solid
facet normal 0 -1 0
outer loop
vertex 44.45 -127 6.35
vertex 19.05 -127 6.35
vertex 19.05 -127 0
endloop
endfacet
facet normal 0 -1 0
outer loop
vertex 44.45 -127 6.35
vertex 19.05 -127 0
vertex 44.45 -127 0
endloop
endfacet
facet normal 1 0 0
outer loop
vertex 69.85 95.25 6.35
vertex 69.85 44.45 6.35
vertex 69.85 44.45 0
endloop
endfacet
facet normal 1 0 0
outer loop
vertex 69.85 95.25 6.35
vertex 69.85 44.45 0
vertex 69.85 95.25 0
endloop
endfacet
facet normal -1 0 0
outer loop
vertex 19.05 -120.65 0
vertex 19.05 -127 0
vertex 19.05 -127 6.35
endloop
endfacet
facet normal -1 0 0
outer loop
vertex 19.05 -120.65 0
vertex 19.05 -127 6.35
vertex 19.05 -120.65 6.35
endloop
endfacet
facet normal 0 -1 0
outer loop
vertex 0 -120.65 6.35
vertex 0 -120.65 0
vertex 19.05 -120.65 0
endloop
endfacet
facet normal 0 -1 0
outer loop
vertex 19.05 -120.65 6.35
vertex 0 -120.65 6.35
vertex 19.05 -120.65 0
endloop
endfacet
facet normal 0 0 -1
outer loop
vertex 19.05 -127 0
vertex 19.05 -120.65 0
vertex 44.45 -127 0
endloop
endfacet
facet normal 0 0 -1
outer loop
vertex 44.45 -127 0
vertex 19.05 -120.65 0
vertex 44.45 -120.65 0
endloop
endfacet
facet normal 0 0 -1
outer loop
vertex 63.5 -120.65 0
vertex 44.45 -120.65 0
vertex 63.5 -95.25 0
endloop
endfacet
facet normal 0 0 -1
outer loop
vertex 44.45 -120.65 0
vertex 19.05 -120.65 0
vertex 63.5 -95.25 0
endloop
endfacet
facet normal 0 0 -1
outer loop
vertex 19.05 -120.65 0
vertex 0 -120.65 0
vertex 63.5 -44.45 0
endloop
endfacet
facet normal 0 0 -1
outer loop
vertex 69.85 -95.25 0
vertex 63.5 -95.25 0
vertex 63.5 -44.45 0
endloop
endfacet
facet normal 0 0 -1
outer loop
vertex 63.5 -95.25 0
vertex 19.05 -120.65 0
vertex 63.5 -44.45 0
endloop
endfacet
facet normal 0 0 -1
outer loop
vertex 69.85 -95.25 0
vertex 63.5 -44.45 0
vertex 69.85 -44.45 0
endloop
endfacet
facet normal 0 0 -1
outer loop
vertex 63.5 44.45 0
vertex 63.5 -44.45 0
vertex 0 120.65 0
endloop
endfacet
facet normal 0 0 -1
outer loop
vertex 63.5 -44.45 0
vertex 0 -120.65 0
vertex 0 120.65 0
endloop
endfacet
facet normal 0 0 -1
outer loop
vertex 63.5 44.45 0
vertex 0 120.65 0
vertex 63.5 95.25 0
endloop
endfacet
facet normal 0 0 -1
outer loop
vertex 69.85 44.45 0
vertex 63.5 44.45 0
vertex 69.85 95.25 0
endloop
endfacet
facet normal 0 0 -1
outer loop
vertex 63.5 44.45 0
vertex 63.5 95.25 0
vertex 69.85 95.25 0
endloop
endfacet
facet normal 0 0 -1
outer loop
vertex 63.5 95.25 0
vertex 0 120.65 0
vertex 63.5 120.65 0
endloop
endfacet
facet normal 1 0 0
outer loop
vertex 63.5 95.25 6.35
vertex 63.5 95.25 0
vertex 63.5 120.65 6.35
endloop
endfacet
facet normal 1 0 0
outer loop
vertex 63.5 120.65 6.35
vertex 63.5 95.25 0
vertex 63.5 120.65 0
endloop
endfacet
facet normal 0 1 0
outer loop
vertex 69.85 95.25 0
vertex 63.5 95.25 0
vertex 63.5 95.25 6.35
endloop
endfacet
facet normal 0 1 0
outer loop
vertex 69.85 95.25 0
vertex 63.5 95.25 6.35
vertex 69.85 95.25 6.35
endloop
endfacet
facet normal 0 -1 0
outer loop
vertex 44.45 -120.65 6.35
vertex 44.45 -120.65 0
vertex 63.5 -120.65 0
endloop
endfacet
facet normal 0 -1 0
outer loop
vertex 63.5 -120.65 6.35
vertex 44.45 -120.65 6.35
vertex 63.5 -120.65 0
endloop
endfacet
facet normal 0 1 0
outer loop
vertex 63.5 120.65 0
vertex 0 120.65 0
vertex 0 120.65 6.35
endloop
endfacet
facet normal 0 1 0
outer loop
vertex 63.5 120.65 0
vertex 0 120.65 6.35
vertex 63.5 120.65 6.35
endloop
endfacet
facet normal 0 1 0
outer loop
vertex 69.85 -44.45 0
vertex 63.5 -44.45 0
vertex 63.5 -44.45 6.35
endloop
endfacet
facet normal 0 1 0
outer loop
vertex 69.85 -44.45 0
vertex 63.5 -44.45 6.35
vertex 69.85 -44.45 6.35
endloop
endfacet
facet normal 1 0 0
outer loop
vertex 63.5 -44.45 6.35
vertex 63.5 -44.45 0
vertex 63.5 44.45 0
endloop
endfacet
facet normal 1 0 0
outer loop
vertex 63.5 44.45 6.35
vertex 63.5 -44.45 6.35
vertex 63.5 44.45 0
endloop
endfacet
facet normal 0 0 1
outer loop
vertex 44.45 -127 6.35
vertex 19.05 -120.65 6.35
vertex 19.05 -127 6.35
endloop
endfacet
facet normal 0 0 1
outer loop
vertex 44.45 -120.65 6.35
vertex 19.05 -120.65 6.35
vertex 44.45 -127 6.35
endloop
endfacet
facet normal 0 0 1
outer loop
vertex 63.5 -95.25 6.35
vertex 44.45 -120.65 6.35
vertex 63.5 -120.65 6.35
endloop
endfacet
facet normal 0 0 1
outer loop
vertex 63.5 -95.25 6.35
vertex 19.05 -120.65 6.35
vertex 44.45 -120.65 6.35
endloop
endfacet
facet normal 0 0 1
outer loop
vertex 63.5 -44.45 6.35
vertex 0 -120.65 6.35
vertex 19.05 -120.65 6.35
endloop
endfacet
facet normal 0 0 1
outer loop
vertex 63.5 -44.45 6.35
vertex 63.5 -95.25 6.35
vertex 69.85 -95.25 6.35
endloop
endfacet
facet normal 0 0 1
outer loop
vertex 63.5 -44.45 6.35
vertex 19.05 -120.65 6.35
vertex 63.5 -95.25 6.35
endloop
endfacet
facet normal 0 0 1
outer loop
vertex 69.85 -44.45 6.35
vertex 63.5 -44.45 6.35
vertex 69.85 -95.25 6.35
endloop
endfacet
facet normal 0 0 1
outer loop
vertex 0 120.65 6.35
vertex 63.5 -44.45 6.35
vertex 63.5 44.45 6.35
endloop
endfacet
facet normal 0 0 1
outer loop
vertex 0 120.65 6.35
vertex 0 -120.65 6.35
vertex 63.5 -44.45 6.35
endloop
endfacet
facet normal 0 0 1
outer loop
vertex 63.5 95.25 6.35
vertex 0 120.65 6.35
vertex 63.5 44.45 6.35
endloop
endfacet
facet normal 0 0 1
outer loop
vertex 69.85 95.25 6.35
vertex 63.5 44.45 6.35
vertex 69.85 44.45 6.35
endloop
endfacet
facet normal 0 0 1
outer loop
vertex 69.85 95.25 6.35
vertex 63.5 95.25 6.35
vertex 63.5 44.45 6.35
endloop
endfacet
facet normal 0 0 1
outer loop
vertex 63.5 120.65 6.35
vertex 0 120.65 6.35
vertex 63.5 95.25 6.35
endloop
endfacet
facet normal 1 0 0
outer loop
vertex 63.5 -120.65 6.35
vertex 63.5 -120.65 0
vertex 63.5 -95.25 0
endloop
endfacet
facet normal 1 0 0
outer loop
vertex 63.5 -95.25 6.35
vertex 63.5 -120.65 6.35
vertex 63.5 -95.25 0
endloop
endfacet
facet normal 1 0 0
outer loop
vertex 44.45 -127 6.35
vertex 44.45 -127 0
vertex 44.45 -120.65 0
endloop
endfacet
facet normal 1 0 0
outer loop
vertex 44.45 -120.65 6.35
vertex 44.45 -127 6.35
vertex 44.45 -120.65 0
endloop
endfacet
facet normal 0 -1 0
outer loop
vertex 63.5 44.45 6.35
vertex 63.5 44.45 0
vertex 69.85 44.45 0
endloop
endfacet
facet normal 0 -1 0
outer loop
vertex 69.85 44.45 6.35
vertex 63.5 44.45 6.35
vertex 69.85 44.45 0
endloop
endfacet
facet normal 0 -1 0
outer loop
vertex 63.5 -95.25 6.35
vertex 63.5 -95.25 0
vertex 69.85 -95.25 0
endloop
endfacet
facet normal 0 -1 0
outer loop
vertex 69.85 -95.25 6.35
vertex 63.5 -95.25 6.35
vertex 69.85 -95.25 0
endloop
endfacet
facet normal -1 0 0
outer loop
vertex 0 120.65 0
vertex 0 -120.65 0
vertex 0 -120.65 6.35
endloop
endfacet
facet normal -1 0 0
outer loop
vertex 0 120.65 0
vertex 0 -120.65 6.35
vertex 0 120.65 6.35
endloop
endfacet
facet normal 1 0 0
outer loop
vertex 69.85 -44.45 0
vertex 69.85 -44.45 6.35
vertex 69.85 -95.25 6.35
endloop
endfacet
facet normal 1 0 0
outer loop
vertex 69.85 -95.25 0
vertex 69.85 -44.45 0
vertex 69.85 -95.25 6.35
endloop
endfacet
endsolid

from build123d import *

# Parameters (mm, degrees)
F0_W     = 63.5
F0_H     = 241.3
F1_DEPTH = 6.35
F2_W     = 6.35
F2_H     = 50.8
F3_DEPTH = 6.35
F4_W     = 25.4
F4_H     = 6.35
F5_DEPTH = 6.35


# Not quite as in the source:
# - a pattern or mirror of a feature is missing from the dataset's text; its kind, count and spacing are read off the source's solid


with BuildPart() as f1:
    # F0 (on Top) → F1 (new body)
    with BuildSketch(Plane.XY):
        with Locations((31.75, 0)):
            Rectangle(F0_W, F0_H)
    extrude(amount=F1_DEPTH)

    # F2 (on face) → F3 (join)
    with BuildSketch(Plane.XY.offset(6.35)):
        with Locations((66.675, 69.85)):
            Rectangle(F2_W, F2_H)
    f3 = extrude(amount=-F3_DEPTH)

    # F3_copies: F3 across plane
    add(f3.mirror(Plane(origin=(0, 0, 0), x_dir=(0, 0, -1), z_dir=(0, -1, 0))))

    # F4 (on face) → F5 (join)
    with BuildSketch(Plane.XY.offset(6.35)):
        with Locations((31.75, -123.825)):
            Rectangle(F4_W, F4_H)
    extrude(amount=-F5_DEPTH)


solid = f1.part
